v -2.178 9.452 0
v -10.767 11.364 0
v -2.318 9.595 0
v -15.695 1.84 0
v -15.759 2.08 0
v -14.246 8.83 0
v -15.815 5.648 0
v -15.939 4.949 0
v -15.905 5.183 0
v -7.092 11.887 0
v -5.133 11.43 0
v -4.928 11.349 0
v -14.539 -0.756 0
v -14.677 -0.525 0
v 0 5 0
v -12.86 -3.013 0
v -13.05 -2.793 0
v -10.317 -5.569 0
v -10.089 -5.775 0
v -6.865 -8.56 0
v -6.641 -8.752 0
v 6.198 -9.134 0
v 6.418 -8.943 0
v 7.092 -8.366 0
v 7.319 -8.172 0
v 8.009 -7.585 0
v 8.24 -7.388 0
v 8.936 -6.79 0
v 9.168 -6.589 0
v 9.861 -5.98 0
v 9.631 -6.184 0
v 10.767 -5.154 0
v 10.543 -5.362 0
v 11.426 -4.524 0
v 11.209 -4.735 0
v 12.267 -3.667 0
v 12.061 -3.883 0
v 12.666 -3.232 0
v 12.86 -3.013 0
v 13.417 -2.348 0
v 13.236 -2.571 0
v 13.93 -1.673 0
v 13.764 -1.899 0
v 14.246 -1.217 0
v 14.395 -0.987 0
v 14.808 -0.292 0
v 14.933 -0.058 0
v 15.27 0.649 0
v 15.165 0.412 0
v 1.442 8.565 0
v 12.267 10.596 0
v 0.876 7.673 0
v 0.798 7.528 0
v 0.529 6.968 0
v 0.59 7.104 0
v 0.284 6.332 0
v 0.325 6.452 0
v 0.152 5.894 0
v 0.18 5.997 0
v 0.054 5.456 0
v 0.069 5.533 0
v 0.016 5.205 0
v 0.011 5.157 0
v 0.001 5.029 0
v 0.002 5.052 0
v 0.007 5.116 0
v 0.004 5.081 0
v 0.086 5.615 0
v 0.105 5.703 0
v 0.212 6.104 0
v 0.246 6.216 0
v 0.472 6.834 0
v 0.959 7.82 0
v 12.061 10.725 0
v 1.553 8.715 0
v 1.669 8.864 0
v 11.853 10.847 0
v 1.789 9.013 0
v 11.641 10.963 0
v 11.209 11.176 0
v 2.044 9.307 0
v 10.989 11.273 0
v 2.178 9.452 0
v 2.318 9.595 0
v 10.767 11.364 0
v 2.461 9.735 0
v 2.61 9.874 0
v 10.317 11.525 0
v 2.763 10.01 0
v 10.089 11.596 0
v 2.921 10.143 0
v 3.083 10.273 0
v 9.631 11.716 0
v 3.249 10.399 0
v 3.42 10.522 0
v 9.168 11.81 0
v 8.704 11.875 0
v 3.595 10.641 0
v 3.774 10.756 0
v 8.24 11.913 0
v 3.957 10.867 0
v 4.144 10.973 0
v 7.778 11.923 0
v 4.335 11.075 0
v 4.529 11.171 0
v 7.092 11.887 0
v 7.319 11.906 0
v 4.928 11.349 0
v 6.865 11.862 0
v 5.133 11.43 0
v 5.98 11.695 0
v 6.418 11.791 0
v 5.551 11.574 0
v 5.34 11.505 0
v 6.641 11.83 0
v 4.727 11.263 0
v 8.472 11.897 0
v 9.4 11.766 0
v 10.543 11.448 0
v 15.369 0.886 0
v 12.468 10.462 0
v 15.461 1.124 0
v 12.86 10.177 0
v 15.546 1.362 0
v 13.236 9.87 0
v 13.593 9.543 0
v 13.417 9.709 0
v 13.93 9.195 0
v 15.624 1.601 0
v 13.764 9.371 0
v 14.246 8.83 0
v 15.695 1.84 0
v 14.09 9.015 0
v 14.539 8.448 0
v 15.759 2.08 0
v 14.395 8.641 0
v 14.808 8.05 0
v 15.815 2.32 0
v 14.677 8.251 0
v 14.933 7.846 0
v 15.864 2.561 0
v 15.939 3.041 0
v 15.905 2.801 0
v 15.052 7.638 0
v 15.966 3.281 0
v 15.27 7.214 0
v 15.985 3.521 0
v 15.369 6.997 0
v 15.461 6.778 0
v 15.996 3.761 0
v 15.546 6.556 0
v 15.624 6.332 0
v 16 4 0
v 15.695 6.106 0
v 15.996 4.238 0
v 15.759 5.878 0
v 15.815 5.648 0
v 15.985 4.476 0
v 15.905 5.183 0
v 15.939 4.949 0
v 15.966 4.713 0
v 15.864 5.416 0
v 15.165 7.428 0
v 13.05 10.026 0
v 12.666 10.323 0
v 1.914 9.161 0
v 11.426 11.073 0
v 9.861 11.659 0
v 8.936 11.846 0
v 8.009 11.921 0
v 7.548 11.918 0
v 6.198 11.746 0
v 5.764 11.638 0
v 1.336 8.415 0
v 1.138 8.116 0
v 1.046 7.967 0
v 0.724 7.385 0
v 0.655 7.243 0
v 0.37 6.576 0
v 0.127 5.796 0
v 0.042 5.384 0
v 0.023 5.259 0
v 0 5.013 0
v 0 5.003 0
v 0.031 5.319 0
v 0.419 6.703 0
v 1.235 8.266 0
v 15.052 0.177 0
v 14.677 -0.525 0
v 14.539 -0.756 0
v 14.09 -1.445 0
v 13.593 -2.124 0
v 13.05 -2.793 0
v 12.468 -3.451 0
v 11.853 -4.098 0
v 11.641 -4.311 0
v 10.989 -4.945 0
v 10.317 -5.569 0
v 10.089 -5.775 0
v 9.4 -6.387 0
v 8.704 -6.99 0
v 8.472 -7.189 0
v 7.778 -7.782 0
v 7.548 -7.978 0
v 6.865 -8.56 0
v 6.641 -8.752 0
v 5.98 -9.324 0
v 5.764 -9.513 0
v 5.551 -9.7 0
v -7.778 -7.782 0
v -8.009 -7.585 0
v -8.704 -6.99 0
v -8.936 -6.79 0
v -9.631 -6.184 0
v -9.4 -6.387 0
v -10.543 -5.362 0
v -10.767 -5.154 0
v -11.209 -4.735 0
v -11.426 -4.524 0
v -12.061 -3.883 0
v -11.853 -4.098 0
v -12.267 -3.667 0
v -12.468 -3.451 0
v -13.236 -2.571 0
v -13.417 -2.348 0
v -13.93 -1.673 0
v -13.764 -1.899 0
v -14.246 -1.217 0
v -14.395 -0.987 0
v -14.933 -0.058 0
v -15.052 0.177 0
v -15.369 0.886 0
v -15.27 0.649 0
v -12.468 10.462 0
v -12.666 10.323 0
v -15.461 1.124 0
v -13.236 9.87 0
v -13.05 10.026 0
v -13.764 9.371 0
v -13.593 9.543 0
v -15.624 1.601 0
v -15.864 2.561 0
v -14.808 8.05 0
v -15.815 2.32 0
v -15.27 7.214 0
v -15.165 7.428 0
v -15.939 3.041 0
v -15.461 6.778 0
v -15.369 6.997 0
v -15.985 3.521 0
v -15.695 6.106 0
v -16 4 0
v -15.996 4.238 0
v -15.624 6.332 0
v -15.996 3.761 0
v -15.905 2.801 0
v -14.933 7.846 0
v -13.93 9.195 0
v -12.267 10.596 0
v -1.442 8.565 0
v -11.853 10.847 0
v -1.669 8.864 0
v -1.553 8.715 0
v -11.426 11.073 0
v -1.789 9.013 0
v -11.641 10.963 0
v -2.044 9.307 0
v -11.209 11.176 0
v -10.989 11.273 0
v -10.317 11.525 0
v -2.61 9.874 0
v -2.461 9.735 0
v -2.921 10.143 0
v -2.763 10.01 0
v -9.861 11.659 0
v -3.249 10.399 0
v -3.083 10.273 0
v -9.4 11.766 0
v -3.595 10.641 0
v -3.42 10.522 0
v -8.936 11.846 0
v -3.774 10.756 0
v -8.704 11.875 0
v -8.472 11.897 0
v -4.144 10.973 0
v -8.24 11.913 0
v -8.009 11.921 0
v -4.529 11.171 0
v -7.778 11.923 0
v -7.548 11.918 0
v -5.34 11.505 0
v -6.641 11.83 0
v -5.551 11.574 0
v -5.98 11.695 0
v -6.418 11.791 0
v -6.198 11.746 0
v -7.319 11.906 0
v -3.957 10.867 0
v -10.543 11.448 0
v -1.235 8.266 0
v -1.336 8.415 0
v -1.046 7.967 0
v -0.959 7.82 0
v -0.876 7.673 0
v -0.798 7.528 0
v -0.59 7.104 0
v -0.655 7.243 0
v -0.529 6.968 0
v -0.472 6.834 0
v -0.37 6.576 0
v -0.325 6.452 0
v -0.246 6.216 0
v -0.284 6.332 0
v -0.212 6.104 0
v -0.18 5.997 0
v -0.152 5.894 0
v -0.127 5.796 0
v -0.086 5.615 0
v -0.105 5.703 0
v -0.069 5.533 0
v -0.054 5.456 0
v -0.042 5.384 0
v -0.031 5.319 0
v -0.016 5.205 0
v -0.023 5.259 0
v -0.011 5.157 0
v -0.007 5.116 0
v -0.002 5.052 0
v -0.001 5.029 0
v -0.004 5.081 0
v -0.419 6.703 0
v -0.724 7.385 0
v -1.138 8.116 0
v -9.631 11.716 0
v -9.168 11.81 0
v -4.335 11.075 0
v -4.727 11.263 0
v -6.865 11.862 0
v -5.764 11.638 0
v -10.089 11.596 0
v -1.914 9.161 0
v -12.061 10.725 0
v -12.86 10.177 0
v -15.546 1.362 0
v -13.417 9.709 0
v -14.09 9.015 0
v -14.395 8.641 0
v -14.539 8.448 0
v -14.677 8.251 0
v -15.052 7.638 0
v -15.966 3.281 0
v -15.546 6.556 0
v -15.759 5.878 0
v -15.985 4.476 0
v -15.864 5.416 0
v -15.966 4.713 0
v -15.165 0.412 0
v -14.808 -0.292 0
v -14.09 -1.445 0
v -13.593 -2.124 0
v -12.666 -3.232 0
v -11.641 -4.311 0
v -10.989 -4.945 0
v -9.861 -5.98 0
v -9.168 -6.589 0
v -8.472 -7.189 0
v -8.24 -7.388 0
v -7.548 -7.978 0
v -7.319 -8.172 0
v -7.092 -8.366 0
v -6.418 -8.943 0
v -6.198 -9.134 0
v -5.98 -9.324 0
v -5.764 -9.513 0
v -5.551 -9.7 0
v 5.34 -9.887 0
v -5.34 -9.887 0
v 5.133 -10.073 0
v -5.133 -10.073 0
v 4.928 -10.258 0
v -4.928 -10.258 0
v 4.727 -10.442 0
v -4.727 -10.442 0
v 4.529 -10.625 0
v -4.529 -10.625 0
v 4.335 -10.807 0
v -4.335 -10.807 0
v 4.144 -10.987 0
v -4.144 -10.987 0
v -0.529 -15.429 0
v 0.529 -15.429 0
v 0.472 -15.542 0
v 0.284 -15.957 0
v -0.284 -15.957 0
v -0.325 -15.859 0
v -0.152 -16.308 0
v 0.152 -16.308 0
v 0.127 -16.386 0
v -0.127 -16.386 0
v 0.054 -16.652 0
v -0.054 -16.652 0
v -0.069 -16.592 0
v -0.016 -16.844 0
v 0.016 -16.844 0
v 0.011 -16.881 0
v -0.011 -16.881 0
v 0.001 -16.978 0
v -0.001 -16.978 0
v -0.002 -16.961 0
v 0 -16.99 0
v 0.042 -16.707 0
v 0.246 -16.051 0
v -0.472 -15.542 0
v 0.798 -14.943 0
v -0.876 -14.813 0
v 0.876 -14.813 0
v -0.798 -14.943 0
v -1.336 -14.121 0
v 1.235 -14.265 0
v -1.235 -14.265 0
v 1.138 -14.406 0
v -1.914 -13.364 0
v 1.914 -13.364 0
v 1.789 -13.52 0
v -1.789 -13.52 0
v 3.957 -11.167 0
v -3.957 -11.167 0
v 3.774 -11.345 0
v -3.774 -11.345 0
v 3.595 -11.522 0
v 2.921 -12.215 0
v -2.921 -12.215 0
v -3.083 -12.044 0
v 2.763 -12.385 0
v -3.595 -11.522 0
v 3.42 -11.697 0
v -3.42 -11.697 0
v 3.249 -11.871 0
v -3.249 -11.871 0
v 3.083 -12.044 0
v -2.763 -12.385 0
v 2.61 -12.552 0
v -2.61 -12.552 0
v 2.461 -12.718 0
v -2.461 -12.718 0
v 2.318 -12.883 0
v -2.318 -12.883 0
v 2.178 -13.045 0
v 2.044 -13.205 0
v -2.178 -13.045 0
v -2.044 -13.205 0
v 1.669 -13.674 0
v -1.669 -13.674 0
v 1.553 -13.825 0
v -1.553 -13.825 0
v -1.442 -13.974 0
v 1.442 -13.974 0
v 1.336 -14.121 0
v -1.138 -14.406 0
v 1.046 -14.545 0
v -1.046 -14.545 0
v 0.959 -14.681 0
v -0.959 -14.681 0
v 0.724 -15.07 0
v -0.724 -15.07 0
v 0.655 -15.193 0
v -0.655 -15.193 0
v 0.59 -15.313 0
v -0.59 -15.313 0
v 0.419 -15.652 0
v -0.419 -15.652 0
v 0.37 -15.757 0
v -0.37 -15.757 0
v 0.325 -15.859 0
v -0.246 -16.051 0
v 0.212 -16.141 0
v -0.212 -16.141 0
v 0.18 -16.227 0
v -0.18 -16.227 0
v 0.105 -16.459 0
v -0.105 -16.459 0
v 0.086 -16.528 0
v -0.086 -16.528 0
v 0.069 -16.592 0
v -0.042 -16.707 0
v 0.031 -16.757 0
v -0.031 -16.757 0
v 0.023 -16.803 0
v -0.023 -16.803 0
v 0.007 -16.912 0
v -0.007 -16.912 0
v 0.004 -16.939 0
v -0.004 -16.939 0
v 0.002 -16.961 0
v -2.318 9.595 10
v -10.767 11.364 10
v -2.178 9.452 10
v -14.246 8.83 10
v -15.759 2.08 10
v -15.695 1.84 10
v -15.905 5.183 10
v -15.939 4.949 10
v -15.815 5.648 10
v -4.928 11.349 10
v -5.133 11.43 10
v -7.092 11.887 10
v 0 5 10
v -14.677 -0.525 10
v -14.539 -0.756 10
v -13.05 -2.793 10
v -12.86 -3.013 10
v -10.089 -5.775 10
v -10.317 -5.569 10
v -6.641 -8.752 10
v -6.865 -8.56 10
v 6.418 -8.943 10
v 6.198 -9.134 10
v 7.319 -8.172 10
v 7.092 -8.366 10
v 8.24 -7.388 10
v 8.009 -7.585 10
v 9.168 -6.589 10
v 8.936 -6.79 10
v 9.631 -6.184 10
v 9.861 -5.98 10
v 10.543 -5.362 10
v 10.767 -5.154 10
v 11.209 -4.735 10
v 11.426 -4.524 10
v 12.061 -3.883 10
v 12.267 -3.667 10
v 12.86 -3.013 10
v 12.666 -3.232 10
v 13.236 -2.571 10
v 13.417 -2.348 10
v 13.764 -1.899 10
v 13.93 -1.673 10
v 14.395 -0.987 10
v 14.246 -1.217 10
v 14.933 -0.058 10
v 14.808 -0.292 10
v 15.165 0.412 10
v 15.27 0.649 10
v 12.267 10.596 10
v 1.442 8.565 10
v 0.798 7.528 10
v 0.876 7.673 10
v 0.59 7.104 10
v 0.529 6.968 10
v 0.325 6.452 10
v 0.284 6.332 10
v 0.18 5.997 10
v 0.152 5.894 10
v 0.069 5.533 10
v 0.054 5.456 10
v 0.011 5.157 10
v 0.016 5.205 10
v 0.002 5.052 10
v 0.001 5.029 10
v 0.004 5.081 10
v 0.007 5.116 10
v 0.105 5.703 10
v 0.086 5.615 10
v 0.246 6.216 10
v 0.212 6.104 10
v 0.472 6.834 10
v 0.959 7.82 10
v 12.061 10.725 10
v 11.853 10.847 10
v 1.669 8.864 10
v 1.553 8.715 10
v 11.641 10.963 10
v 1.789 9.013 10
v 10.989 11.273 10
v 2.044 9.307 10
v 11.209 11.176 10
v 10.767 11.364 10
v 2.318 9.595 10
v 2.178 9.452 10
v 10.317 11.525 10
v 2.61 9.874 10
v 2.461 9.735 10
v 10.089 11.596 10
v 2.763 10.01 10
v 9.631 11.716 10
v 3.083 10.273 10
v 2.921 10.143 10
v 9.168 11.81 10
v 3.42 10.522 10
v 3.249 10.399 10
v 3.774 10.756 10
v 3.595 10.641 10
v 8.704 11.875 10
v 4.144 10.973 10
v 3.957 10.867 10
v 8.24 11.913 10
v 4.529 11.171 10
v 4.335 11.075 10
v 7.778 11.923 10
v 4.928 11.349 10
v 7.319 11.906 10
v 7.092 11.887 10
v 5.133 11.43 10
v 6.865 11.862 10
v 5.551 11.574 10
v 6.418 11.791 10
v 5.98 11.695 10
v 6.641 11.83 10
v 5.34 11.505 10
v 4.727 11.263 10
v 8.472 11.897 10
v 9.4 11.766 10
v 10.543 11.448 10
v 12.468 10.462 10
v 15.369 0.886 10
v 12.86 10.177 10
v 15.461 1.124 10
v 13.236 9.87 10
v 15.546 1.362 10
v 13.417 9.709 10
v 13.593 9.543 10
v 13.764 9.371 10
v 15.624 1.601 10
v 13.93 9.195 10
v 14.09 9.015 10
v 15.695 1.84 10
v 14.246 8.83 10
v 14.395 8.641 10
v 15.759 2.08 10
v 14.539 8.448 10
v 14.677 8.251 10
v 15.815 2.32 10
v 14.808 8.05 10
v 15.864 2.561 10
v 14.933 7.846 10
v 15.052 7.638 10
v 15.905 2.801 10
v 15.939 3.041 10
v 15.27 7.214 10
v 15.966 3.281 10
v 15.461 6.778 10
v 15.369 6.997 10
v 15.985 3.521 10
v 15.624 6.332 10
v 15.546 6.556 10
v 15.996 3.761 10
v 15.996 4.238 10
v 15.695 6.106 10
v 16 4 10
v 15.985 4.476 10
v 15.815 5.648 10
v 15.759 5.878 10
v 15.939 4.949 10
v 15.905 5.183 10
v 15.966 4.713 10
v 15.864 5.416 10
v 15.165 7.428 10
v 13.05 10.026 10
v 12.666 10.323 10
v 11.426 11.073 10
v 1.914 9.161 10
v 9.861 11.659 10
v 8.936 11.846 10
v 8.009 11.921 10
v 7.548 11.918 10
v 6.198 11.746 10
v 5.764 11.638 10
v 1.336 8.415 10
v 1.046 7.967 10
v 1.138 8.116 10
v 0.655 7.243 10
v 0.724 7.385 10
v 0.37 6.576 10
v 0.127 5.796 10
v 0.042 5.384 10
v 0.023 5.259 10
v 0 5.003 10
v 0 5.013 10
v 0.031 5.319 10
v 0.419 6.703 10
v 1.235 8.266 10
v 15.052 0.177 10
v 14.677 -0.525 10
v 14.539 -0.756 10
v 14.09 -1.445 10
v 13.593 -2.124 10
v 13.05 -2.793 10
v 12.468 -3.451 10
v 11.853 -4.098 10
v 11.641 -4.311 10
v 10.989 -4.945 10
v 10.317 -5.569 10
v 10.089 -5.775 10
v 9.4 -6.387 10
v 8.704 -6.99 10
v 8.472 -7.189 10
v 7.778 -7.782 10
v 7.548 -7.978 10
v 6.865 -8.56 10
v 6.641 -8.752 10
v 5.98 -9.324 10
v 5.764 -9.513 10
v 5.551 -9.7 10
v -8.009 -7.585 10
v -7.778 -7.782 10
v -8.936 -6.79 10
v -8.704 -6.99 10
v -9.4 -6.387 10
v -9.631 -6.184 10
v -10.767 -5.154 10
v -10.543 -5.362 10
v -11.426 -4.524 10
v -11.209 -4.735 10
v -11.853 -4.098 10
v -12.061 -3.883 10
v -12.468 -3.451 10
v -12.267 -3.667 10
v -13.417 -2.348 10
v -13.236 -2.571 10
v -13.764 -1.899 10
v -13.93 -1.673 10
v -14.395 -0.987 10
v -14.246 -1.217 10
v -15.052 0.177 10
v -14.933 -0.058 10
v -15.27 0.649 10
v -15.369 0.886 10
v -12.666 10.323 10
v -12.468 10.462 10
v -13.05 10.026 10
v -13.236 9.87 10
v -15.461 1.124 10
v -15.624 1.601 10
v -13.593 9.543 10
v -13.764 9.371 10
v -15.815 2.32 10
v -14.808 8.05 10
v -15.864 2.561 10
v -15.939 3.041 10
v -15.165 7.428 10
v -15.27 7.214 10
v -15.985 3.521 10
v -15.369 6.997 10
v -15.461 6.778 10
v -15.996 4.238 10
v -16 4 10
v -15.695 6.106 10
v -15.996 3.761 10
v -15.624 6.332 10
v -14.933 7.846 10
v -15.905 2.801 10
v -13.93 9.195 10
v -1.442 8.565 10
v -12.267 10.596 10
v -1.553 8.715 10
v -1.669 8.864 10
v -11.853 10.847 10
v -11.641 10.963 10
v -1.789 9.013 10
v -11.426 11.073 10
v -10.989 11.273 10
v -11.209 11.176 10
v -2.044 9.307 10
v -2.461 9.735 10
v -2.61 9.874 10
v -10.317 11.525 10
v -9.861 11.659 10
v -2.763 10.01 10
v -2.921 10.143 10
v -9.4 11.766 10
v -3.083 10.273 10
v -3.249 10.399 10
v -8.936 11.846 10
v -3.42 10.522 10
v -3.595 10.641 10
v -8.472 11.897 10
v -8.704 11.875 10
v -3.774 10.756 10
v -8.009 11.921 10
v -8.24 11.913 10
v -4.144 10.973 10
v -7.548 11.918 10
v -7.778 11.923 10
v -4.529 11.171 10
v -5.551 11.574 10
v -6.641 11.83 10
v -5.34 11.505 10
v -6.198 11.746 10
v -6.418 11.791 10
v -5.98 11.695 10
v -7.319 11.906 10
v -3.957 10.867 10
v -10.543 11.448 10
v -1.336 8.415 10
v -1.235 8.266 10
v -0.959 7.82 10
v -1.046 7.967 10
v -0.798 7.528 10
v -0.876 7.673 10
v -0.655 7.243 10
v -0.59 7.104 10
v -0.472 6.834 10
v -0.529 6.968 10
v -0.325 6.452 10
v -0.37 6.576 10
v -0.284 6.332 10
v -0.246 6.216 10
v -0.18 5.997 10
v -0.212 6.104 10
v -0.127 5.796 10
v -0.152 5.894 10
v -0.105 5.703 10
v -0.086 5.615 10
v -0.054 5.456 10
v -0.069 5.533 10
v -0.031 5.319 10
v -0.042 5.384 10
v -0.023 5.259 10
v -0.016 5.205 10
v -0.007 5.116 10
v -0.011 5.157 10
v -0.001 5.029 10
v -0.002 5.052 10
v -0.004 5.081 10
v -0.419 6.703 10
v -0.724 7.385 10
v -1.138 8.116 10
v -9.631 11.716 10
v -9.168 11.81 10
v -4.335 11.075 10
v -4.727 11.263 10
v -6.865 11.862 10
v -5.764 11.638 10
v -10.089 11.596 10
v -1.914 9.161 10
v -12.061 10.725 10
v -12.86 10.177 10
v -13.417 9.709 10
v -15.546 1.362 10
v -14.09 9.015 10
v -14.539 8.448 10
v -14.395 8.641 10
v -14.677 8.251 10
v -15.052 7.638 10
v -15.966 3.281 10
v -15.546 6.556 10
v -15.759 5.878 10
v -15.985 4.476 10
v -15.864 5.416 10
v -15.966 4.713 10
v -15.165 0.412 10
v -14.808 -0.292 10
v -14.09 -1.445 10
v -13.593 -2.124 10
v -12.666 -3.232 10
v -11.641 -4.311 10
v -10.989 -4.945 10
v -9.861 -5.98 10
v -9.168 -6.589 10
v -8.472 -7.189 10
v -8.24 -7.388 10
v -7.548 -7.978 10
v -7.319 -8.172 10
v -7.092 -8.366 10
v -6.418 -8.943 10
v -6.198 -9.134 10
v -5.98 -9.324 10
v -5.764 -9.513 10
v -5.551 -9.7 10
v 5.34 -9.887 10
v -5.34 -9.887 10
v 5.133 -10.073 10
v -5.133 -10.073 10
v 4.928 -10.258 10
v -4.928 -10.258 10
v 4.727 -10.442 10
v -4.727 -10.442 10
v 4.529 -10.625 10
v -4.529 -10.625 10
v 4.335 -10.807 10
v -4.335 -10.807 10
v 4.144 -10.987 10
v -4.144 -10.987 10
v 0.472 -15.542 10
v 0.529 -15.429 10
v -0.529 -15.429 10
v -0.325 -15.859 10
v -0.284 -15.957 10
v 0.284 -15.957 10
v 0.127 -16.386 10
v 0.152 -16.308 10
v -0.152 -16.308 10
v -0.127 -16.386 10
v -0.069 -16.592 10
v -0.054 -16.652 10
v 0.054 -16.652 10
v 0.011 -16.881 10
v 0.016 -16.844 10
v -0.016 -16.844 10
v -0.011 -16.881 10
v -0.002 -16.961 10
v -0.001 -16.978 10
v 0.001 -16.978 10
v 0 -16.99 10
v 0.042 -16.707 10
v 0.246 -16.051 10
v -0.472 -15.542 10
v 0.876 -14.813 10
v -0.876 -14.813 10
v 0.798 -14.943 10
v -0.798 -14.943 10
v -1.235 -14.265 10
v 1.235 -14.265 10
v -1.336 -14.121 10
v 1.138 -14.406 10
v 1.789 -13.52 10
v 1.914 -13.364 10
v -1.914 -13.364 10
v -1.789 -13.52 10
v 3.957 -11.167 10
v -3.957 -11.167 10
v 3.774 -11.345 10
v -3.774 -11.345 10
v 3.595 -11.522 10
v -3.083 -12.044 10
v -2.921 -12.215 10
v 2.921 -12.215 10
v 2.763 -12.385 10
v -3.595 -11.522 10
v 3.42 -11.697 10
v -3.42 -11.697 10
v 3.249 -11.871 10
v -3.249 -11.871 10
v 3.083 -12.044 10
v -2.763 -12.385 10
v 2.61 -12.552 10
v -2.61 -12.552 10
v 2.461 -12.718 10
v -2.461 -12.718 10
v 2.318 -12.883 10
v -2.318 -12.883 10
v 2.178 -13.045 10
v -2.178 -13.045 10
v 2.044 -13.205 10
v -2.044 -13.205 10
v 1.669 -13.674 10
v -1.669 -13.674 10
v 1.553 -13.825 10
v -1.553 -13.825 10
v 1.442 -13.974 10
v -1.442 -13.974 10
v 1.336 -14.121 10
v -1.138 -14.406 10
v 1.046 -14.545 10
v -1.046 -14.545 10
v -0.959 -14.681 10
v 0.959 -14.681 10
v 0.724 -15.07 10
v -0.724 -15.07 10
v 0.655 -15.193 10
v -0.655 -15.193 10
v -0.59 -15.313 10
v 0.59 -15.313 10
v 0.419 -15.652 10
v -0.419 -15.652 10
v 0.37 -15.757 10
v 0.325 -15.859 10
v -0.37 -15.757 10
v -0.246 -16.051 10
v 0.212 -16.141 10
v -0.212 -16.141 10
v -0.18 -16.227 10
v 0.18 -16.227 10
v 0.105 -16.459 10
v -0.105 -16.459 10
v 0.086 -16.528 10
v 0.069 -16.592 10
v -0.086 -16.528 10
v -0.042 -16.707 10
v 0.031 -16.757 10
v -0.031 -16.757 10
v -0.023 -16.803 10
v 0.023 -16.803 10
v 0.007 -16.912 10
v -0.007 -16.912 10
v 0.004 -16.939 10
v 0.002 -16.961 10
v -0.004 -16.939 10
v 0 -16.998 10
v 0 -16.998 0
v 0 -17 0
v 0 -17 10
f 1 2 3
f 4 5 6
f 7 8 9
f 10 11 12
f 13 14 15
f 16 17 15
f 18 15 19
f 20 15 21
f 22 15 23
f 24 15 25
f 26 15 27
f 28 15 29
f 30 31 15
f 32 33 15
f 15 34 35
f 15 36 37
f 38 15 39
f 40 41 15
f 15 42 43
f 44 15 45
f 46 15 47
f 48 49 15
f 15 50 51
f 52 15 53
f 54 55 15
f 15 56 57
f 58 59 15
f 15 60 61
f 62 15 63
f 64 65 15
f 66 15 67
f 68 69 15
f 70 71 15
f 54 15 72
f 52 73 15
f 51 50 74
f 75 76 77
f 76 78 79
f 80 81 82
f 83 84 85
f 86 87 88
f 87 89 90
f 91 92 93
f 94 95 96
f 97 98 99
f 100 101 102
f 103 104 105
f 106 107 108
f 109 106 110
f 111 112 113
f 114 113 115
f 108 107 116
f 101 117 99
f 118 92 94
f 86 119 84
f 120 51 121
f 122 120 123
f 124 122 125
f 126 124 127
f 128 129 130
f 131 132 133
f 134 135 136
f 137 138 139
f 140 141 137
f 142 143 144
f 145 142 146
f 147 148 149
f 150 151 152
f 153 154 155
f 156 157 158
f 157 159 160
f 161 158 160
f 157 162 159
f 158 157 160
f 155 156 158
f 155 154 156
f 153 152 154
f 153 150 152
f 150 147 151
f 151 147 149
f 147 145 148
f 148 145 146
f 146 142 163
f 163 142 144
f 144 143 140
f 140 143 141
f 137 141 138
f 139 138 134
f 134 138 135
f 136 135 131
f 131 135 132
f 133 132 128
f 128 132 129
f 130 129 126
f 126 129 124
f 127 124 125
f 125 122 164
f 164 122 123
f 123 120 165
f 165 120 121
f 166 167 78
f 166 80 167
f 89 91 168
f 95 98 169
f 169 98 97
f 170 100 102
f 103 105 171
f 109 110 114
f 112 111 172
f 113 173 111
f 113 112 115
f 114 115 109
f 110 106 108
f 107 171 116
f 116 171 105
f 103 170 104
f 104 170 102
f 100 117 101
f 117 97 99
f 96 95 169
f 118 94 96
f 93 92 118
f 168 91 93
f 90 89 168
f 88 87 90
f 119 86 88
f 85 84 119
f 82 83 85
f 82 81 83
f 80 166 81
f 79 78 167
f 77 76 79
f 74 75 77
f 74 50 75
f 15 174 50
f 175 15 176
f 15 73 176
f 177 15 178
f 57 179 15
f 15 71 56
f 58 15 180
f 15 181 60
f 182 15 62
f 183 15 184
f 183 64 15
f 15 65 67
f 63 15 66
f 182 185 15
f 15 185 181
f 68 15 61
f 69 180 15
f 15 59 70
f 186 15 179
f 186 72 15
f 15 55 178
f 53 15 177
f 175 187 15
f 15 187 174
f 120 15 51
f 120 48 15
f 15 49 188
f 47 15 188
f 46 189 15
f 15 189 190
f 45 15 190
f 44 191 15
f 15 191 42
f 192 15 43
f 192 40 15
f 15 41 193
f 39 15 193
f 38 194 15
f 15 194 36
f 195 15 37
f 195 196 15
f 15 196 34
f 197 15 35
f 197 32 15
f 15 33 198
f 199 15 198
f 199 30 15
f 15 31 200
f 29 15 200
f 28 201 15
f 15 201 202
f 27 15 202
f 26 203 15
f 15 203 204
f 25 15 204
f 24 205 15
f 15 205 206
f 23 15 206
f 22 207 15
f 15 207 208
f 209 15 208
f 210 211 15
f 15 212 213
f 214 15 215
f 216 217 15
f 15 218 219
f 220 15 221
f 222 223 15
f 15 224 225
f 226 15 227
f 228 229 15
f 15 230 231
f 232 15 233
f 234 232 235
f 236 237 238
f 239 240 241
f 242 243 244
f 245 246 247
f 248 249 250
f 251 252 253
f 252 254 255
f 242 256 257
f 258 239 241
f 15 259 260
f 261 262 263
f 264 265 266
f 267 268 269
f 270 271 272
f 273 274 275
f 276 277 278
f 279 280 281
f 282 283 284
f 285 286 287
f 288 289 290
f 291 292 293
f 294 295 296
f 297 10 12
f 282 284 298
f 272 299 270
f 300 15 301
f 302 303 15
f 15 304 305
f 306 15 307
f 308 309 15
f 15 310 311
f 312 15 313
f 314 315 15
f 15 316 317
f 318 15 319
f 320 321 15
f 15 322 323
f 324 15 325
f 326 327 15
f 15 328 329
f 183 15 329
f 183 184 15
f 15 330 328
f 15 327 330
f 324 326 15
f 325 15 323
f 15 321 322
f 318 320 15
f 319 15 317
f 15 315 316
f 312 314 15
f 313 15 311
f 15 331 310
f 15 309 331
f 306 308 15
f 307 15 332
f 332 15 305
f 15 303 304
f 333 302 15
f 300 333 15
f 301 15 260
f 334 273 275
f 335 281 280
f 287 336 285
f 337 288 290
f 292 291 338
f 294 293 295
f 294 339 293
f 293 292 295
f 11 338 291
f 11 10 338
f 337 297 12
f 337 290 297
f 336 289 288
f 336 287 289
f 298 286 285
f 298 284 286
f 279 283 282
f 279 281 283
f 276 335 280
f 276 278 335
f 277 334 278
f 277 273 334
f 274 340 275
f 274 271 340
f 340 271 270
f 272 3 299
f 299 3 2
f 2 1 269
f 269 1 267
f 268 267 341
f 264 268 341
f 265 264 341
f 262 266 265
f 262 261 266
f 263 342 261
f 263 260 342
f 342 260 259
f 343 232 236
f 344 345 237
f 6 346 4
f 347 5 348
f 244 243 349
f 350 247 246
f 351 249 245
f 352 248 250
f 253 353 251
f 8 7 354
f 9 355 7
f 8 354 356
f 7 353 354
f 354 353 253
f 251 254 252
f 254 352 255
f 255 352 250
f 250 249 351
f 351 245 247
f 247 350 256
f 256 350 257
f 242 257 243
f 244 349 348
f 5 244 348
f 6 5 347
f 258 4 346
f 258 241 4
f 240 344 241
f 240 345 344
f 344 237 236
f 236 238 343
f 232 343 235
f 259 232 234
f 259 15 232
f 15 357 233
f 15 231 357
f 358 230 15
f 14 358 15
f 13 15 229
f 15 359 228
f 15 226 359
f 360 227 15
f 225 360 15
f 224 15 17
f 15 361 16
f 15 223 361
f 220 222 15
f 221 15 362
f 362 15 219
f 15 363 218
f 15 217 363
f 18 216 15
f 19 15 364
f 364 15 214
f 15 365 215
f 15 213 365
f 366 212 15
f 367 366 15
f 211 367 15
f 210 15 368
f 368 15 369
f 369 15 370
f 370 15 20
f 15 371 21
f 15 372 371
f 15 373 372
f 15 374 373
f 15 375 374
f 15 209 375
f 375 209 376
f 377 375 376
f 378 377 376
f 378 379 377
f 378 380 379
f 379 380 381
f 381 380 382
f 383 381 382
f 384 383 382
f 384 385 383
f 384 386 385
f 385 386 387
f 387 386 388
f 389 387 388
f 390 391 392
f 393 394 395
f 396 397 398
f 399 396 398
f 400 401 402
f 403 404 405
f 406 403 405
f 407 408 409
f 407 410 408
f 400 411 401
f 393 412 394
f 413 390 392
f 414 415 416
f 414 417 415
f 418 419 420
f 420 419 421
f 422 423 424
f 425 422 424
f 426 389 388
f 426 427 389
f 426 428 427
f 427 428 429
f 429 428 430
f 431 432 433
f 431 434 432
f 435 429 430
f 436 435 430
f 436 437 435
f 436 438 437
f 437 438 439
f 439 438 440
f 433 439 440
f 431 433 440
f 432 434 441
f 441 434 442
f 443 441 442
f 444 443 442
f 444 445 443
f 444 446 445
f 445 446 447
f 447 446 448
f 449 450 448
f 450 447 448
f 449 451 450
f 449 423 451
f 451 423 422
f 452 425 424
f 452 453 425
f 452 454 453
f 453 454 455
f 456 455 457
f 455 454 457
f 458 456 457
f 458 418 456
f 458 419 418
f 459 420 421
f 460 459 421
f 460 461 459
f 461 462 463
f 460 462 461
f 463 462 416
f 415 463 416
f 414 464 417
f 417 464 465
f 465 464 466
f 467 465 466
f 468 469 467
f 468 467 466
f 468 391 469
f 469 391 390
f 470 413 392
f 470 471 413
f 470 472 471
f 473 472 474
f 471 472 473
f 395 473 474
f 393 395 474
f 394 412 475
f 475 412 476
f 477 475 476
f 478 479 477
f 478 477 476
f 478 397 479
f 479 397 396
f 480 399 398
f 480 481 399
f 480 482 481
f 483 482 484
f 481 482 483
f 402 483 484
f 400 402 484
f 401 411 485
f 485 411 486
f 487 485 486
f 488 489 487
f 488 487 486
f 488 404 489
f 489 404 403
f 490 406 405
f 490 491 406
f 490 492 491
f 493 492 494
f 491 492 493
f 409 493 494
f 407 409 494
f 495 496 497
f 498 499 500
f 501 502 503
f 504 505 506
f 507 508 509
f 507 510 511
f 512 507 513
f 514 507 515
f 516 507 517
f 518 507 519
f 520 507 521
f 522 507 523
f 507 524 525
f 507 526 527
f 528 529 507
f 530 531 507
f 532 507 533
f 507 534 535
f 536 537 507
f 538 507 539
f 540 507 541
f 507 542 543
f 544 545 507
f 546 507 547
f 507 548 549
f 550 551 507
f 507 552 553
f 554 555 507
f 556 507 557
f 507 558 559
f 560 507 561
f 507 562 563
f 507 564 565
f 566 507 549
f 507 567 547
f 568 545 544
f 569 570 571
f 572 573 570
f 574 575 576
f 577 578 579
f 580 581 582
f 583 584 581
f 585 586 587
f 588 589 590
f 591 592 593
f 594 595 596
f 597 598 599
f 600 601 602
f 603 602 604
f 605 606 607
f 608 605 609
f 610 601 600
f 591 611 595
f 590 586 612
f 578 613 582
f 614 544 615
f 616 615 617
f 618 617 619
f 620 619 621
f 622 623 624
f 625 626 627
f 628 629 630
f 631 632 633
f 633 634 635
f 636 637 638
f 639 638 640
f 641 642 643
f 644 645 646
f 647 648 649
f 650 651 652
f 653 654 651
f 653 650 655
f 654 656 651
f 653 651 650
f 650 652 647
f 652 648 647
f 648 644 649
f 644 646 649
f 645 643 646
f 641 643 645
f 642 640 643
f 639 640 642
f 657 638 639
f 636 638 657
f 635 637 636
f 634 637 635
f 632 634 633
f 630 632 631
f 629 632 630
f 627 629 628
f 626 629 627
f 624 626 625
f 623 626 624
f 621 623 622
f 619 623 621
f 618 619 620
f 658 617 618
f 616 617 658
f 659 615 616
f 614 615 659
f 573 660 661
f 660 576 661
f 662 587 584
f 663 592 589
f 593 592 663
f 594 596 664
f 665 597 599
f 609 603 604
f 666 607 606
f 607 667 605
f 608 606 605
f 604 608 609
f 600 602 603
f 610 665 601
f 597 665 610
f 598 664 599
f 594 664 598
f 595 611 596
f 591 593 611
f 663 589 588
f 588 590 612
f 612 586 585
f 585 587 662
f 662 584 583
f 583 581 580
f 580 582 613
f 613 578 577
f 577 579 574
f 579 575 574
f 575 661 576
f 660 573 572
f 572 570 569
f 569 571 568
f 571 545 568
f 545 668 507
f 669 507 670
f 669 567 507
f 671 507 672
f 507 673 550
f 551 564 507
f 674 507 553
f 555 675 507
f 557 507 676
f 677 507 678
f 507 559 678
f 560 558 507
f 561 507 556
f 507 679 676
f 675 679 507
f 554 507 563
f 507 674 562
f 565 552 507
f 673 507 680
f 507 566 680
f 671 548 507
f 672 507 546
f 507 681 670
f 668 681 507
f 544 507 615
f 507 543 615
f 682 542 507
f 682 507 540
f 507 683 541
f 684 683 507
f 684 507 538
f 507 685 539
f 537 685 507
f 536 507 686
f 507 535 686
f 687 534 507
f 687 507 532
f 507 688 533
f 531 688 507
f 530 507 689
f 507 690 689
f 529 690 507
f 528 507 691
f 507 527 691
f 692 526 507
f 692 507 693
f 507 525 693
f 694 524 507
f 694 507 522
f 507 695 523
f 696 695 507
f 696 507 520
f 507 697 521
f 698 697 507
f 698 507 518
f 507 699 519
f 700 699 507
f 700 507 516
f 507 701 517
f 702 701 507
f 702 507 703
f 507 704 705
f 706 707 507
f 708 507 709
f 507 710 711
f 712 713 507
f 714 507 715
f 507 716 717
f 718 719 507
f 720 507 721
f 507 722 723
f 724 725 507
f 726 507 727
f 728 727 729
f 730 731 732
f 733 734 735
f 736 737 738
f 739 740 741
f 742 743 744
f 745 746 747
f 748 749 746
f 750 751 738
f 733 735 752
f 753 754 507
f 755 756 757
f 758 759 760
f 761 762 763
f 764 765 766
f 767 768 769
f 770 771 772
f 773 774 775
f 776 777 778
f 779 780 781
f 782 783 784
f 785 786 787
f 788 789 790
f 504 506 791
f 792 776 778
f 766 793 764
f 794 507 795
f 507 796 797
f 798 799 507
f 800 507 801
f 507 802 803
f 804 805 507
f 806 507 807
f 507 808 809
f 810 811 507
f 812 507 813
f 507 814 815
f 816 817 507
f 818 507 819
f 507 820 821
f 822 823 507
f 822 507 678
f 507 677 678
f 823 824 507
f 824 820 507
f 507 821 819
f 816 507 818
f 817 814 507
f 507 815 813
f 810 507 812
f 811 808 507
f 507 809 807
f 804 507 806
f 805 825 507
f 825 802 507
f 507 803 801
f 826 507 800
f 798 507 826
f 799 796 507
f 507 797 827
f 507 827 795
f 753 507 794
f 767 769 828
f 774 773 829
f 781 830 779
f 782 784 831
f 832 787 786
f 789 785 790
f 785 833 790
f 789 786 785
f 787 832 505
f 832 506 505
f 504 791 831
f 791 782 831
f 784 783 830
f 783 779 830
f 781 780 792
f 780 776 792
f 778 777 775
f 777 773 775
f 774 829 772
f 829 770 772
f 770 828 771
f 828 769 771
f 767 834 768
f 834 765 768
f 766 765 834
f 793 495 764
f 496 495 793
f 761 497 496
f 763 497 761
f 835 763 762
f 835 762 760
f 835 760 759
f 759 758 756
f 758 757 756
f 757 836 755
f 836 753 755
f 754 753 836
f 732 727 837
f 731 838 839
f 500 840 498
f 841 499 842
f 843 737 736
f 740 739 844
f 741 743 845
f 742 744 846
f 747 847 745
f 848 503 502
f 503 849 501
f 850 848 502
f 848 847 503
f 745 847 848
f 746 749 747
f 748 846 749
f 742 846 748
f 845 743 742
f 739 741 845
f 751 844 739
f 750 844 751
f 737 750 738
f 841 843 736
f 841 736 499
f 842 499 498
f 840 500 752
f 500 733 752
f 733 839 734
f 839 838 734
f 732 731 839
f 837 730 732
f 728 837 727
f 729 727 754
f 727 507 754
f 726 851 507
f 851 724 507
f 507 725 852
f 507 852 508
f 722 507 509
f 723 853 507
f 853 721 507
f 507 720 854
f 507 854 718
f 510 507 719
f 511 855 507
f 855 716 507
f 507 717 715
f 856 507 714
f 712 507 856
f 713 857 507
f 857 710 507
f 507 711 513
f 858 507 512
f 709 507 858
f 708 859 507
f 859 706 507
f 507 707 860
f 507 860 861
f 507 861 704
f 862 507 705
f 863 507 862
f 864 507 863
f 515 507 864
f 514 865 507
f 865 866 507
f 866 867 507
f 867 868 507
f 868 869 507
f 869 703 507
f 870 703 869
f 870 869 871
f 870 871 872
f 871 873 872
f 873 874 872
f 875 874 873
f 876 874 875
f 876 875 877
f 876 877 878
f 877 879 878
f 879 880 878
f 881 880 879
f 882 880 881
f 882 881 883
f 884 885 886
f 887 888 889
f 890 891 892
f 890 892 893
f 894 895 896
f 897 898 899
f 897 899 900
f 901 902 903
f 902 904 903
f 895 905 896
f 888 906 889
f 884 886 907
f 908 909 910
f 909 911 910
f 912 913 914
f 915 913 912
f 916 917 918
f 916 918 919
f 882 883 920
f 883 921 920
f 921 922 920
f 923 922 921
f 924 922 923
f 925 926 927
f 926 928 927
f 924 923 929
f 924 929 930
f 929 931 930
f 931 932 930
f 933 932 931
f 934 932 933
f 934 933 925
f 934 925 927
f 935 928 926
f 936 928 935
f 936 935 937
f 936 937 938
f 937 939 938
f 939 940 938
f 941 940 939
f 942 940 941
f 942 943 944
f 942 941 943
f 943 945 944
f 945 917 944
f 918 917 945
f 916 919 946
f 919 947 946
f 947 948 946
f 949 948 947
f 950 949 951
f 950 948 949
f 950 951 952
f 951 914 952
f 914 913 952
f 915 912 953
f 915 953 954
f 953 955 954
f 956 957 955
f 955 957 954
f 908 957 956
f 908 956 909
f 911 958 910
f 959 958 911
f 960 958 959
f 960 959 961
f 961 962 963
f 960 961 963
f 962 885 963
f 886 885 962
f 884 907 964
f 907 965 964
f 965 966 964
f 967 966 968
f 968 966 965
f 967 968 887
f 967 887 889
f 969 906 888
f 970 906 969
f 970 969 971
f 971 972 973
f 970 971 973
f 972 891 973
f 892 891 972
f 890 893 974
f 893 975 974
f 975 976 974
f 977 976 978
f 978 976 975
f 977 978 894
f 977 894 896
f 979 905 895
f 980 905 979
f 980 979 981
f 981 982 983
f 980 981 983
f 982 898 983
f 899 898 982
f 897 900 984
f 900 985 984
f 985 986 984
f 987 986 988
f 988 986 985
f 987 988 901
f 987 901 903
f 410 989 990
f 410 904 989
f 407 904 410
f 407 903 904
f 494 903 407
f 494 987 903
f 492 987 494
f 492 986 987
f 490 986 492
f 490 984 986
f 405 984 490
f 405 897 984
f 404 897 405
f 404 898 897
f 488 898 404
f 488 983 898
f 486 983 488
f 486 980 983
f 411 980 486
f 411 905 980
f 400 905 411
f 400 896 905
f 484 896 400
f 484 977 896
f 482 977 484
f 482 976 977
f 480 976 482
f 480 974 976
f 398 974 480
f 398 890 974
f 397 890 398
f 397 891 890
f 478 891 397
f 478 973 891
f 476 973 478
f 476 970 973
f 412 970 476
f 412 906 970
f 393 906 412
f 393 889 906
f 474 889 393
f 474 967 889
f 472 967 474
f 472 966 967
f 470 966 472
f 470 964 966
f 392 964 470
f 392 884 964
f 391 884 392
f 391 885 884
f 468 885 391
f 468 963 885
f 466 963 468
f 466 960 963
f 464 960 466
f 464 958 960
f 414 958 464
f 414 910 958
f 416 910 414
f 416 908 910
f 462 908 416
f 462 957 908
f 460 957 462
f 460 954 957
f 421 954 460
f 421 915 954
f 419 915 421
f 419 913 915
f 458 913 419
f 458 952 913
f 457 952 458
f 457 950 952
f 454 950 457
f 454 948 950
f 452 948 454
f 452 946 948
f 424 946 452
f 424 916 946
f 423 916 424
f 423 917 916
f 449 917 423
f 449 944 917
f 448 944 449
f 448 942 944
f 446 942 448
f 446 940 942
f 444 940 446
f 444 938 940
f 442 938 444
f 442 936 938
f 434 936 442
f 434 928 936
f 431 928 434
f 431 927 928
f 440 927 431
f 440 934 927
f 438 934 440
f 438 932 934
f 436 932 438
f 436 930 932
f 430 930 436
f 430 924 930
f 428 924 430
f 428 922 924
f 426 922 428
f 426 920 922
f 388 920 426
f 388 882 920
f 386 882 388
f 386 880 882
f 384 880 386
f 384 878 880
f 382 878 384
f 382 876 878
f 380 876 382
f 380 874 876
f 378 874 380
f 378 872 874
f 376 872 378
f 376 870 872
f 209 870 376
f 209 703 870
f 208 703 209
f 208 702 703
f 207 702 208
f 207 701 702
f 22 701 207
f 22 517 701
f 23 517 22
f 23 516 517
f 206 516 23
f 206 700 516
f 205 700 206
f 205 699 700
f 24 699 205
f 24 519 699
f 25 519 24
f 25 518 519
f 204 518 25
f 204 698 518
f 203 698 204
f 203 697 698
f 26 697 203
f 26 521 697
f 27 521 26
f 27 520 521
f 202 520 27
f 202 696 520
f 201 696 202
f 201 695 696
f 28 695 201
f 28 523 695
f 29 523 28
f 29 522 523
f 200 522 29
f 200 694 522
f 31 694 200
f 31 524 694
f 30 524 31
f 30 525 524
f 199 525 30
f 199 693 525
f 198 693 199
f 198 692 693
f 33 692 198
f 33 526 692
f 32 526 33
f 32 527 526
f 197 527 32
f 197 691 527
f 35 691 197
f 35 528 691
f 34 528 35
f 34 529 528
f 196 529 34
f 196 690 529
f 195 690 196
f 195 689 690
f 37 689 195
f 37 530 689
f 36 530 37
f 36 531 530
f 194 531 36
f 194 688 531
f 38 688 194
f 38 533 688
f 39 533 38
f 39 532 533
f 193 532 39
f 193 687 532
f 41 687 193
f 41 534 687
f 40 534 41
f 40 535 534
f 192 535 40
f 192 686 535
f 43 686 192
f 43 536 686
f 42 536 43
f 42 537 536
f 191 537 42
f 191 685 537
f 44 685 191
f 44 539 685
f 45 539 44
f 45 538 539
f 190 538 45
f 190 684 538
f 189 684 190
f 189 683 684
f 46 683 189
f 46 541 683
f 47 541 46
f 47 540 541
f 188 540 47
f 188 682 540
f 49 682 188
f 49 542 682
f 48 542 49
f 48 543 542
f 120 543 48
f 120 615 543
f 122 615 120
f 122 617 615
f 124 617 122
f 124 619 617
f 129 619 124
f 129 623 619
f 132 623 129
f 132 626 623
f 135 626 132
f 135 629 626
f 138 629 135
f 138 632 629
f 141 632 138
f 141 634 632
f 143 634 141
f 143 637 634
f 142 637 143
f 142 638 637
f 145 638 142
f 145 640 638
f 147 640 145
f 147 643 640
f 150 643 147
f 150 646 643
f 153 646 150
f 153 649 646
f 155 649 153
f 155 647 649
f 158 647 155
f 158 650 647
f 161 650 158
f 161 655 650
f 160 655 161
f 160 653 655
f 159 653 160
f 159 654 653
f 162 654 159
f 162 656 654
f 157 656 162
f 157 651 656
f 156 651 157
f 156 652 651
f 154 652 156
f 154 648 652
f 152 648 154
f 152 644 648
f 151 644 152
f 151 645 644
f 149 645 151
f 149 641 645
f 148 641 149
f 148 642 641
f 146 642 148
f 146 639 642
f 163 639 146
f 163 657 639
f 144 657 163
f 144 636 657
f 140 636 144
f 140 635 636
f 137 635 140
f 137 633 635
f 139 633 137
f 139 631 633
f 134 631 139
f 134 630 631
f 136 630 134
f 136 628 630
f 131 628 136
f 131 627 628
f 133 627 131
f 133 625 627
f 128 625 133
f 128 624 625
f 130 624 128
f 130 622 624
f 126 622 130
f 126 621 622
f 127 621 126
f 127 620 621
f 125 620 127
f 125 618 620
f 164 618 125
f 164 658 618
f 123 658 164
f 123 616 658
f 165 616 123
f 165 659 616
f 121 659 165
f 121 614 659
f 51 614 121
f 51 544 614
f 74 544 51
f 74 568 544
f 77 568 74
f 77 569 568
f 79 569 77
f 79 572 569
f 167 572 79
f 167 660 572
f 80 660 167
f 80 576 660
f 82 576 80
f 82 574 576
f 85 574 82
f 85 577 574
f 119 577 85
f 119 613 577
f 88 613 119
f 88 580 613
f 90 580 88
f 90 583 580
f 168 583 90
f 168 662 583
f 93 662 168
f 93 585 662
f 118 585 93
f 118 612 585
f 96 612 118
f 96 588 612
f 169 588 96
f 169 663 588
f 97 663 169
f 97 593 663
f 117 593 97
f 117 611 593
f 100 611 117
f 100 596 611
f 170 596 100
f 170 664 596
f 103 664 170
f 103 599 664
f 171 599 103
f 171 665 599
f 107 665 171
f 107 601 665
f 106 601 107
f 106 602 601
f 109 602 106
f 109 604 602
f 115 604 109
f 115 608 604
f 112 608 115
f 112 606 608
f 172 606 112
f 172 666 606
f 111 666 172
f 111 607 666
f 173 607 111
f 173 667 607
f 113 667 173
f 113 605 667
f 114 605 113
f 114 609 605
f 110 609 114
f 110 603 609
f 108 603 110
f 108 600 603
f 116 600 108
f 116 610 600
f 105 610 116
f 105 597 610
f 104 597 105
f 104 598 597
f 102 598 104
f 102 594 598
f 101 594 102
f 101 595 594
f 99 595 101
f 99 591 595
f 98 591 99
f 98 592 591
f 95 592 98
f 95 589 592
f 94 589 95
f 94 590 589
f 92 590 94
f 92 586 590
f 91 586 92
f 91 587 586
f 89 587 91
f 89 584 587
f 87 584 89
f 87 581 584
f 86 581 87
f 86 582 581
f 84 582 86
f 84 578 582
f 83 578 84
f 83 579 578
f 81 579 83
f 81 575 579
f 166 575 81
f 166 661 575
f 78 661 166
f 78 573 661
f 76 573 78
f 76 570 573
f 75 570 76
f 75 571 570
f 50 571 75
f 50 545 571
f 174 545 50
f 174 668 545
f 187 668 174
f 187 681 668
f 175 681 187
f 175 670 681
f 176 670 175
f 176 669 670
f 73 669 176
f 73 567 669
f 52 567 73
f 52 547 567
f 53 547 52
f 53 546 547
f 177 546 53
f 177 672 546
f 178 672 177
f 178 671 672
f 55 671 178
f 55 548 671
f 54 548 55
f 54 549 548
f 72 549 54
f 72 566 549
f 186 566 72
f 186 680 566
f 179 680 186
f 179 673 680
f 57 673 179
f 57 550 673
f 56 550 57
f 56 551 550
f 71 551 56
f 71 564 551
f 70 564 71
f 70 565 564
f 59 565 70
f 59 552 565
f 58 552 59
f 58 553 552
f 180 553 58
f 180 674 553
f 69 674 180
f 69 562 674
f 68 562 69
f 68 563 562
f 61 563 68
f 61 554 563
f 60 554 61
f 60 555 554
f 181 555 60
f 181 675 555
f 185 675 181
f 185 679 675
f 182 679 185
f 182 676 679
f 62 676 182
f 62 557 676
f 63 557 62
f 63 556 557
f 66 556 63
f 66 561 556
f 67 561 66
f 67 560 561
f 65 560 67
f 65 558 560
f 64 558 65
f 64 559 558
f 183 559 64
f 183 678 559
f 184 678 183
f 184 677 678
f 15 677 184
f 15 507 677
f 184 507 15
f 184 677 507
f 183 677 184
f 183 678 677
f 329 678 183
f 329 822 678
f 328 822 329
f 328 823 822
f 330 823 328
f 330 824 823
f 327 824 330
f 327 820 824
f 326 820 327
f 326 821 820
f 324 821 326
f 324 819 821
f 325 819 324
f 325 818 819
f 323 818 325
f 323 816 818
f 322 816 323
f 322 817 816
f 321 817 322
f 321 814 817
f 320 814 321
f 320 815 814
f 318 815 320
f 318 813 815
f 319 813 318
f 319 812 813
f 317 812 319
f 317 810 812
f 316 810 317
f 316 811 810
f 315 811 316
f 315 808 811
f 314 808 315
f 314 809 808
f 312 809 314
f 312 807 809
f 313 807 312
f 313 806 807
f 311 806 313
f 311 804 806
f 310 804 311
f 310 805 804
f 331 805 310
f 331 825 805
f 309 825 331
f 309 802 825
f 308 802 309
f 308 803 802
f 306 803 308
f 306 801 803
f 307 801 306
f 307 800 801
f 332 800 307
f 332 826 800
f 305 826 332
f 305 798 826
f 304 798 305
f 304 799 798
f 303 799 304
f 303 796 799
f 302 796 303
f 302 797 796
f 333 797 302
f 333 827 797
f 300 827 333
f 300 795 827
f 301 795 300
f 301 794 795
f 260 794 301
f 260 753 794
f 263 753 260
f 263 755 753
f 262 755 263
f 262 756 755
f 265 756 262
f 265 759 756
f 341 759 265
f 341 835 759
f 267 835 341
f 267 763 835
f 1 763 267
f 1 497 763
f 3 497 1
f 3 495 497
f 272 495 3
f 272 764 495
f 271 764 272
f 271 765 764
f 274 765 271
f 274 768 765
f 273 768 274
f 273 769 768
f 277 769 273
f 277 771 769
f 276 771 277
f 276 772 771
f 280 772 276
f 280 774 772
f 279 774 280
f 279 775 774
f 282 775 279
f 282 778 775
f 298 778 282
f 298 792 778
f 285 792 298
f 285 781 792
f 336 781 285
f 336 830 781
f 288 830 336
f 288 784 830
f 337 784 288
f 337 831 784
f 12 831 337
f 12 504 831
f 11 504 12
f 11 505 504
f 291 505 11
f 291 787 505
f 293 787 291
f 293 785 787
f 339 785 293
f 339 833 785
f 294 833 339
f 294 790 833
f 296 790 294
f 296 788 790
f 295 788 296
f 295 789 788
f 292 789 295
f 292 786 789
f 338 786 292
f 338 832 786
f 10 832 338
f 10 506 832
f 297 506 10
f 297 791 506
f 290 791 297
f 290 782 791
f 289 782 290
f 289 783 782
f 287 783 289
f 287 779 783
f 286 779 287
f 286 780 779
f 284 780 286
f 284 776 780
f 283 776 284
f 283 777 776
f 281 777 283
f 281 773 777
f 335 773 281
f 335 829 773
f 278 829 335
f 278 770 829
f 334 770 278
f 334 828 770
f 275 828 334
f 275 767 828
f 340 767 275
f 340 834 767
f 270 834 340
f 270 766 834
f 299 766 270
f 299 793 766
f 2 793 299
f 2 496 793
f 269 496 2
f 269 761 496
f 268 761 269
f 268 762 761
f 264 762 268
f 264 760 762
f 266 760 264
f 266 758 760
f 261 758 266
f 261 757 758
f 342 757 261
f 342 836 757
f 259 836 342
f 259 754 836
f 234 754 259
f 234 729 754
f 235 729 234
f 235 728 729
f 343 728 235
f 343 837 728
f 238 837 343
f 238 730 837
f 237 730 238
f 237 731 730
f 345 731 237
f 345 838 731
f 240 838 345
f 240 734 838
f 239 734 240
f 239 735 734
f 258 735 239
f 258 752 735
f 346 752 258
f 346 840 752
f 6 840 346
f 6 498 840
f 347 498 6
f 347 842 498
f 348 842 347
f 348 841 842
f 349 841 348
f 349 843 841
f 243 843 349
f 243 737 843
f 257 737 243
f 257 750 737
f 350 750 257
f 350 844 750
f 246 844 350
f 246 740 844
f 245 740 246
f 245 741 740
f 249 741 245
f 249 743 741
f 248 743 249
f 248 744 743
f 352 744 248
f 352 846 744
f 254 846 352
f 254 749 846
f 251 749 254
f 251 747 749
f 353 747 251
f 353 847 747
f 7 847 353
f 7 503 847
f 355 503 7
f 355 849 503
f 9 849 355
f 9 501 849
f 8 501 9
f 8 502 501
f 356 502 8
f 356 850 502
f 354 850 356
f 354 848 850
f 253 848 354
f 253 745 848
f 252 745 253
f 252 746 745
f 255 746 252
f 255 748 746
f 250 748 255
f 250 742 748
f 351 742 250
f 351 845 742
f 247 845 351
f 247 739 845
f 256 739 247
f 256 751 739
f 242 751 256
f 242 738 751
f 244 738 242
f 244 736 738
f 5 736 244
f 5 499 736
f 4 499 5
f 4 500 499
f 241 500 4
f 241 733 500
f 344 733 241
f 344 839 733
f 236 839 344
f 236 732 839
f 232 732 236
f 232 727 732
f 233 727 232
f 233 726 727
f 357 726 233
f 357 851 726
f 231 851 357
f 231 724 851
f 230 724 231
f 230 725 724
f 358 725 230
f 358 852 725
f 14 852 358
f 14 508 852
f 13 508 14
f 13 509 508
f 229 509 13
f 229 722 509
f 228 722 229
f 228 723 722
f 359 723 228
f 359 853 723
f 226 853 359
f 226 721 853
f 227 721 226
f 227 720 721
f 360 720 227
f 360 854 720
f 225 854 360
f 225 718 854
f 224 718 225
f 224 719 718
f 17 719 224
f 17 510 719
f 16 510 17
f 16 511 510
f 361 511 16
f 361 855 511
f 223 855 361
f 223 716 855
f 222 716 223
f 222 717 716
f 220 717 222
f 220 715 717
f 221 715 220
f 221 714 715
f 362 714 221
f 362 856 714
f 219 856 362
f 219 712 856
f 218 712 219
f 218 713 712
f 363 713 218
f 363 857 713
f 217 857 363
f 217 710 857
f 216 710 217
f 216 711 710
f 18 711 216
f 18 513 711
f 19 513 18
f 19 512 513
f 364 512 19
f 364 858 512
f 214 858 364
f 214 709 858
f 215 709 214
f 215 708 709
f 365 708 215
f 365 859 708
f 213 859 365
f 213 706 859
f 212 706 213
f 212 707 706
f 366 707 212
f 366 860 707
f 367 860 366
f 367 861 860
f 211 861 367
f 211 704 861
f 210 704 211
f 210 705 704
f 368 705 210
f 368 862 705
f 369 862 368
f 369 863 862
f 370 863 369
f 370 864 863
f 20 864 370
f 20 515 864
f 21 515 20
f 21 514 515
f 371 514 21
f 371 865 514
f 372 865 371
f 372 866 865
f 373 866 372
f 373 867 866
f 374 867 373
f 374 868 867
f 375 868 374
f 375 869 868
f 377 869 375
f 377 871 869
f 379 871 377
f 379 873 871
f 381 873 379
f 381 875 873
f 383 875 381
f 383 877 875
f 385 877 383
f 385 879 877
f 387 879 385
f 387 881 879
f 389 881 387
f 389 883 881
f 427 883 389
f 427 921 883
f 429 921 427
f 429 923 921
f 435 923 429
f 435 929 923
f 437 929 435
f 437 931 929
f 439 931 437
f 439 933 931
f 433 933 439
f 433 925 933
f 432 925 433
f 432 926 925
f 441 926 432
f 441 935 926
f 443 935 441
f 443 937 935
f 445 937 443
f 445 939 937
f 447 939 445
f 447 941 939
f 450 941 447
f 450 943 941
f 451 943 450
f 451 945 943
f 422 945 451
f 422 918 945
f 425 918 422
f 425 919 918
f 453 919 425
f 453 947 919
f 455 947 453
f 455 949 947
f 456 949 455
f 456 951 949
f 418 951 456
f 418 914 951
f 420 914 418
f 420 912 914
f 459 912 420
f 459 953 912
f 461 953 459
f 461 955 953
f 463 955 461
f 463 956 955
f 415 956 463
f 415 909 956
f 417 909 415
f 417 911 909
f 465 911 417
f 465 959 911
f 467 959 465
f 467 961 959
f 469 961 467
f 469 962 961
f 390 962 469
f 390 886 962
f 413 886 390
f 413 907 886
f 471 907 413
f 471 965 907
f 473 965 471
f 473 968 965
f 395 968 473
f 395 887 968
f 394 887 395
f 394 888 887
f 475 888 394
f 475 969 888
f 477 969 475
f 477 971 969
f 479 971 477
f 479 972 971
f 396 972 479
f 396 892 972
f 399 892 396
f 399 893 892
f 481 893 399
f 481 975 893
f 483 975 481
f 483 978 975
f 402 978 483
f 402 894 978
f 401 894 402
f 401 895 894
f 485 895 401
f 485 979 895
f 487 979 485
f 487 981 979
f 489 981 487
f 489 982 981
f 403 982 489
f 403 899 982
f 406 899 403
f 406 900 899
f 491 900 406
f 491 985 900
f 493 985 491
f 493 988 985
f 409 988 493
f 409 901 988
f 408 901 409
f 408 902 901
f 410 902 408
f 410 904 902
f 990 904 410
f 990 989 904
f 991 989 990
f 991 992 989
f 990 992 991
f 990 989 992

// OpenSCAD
n = 500;
h = 10;
step = 360/n;
points = [ for (t=[0:step:359.999]) [16*pow(sin(t),3), 13*cos(t) - 5*cos(2*t) - 2*cos(3*t) - cos(4*t)]];
linear_extrude(height=h)
    polygon(points);
